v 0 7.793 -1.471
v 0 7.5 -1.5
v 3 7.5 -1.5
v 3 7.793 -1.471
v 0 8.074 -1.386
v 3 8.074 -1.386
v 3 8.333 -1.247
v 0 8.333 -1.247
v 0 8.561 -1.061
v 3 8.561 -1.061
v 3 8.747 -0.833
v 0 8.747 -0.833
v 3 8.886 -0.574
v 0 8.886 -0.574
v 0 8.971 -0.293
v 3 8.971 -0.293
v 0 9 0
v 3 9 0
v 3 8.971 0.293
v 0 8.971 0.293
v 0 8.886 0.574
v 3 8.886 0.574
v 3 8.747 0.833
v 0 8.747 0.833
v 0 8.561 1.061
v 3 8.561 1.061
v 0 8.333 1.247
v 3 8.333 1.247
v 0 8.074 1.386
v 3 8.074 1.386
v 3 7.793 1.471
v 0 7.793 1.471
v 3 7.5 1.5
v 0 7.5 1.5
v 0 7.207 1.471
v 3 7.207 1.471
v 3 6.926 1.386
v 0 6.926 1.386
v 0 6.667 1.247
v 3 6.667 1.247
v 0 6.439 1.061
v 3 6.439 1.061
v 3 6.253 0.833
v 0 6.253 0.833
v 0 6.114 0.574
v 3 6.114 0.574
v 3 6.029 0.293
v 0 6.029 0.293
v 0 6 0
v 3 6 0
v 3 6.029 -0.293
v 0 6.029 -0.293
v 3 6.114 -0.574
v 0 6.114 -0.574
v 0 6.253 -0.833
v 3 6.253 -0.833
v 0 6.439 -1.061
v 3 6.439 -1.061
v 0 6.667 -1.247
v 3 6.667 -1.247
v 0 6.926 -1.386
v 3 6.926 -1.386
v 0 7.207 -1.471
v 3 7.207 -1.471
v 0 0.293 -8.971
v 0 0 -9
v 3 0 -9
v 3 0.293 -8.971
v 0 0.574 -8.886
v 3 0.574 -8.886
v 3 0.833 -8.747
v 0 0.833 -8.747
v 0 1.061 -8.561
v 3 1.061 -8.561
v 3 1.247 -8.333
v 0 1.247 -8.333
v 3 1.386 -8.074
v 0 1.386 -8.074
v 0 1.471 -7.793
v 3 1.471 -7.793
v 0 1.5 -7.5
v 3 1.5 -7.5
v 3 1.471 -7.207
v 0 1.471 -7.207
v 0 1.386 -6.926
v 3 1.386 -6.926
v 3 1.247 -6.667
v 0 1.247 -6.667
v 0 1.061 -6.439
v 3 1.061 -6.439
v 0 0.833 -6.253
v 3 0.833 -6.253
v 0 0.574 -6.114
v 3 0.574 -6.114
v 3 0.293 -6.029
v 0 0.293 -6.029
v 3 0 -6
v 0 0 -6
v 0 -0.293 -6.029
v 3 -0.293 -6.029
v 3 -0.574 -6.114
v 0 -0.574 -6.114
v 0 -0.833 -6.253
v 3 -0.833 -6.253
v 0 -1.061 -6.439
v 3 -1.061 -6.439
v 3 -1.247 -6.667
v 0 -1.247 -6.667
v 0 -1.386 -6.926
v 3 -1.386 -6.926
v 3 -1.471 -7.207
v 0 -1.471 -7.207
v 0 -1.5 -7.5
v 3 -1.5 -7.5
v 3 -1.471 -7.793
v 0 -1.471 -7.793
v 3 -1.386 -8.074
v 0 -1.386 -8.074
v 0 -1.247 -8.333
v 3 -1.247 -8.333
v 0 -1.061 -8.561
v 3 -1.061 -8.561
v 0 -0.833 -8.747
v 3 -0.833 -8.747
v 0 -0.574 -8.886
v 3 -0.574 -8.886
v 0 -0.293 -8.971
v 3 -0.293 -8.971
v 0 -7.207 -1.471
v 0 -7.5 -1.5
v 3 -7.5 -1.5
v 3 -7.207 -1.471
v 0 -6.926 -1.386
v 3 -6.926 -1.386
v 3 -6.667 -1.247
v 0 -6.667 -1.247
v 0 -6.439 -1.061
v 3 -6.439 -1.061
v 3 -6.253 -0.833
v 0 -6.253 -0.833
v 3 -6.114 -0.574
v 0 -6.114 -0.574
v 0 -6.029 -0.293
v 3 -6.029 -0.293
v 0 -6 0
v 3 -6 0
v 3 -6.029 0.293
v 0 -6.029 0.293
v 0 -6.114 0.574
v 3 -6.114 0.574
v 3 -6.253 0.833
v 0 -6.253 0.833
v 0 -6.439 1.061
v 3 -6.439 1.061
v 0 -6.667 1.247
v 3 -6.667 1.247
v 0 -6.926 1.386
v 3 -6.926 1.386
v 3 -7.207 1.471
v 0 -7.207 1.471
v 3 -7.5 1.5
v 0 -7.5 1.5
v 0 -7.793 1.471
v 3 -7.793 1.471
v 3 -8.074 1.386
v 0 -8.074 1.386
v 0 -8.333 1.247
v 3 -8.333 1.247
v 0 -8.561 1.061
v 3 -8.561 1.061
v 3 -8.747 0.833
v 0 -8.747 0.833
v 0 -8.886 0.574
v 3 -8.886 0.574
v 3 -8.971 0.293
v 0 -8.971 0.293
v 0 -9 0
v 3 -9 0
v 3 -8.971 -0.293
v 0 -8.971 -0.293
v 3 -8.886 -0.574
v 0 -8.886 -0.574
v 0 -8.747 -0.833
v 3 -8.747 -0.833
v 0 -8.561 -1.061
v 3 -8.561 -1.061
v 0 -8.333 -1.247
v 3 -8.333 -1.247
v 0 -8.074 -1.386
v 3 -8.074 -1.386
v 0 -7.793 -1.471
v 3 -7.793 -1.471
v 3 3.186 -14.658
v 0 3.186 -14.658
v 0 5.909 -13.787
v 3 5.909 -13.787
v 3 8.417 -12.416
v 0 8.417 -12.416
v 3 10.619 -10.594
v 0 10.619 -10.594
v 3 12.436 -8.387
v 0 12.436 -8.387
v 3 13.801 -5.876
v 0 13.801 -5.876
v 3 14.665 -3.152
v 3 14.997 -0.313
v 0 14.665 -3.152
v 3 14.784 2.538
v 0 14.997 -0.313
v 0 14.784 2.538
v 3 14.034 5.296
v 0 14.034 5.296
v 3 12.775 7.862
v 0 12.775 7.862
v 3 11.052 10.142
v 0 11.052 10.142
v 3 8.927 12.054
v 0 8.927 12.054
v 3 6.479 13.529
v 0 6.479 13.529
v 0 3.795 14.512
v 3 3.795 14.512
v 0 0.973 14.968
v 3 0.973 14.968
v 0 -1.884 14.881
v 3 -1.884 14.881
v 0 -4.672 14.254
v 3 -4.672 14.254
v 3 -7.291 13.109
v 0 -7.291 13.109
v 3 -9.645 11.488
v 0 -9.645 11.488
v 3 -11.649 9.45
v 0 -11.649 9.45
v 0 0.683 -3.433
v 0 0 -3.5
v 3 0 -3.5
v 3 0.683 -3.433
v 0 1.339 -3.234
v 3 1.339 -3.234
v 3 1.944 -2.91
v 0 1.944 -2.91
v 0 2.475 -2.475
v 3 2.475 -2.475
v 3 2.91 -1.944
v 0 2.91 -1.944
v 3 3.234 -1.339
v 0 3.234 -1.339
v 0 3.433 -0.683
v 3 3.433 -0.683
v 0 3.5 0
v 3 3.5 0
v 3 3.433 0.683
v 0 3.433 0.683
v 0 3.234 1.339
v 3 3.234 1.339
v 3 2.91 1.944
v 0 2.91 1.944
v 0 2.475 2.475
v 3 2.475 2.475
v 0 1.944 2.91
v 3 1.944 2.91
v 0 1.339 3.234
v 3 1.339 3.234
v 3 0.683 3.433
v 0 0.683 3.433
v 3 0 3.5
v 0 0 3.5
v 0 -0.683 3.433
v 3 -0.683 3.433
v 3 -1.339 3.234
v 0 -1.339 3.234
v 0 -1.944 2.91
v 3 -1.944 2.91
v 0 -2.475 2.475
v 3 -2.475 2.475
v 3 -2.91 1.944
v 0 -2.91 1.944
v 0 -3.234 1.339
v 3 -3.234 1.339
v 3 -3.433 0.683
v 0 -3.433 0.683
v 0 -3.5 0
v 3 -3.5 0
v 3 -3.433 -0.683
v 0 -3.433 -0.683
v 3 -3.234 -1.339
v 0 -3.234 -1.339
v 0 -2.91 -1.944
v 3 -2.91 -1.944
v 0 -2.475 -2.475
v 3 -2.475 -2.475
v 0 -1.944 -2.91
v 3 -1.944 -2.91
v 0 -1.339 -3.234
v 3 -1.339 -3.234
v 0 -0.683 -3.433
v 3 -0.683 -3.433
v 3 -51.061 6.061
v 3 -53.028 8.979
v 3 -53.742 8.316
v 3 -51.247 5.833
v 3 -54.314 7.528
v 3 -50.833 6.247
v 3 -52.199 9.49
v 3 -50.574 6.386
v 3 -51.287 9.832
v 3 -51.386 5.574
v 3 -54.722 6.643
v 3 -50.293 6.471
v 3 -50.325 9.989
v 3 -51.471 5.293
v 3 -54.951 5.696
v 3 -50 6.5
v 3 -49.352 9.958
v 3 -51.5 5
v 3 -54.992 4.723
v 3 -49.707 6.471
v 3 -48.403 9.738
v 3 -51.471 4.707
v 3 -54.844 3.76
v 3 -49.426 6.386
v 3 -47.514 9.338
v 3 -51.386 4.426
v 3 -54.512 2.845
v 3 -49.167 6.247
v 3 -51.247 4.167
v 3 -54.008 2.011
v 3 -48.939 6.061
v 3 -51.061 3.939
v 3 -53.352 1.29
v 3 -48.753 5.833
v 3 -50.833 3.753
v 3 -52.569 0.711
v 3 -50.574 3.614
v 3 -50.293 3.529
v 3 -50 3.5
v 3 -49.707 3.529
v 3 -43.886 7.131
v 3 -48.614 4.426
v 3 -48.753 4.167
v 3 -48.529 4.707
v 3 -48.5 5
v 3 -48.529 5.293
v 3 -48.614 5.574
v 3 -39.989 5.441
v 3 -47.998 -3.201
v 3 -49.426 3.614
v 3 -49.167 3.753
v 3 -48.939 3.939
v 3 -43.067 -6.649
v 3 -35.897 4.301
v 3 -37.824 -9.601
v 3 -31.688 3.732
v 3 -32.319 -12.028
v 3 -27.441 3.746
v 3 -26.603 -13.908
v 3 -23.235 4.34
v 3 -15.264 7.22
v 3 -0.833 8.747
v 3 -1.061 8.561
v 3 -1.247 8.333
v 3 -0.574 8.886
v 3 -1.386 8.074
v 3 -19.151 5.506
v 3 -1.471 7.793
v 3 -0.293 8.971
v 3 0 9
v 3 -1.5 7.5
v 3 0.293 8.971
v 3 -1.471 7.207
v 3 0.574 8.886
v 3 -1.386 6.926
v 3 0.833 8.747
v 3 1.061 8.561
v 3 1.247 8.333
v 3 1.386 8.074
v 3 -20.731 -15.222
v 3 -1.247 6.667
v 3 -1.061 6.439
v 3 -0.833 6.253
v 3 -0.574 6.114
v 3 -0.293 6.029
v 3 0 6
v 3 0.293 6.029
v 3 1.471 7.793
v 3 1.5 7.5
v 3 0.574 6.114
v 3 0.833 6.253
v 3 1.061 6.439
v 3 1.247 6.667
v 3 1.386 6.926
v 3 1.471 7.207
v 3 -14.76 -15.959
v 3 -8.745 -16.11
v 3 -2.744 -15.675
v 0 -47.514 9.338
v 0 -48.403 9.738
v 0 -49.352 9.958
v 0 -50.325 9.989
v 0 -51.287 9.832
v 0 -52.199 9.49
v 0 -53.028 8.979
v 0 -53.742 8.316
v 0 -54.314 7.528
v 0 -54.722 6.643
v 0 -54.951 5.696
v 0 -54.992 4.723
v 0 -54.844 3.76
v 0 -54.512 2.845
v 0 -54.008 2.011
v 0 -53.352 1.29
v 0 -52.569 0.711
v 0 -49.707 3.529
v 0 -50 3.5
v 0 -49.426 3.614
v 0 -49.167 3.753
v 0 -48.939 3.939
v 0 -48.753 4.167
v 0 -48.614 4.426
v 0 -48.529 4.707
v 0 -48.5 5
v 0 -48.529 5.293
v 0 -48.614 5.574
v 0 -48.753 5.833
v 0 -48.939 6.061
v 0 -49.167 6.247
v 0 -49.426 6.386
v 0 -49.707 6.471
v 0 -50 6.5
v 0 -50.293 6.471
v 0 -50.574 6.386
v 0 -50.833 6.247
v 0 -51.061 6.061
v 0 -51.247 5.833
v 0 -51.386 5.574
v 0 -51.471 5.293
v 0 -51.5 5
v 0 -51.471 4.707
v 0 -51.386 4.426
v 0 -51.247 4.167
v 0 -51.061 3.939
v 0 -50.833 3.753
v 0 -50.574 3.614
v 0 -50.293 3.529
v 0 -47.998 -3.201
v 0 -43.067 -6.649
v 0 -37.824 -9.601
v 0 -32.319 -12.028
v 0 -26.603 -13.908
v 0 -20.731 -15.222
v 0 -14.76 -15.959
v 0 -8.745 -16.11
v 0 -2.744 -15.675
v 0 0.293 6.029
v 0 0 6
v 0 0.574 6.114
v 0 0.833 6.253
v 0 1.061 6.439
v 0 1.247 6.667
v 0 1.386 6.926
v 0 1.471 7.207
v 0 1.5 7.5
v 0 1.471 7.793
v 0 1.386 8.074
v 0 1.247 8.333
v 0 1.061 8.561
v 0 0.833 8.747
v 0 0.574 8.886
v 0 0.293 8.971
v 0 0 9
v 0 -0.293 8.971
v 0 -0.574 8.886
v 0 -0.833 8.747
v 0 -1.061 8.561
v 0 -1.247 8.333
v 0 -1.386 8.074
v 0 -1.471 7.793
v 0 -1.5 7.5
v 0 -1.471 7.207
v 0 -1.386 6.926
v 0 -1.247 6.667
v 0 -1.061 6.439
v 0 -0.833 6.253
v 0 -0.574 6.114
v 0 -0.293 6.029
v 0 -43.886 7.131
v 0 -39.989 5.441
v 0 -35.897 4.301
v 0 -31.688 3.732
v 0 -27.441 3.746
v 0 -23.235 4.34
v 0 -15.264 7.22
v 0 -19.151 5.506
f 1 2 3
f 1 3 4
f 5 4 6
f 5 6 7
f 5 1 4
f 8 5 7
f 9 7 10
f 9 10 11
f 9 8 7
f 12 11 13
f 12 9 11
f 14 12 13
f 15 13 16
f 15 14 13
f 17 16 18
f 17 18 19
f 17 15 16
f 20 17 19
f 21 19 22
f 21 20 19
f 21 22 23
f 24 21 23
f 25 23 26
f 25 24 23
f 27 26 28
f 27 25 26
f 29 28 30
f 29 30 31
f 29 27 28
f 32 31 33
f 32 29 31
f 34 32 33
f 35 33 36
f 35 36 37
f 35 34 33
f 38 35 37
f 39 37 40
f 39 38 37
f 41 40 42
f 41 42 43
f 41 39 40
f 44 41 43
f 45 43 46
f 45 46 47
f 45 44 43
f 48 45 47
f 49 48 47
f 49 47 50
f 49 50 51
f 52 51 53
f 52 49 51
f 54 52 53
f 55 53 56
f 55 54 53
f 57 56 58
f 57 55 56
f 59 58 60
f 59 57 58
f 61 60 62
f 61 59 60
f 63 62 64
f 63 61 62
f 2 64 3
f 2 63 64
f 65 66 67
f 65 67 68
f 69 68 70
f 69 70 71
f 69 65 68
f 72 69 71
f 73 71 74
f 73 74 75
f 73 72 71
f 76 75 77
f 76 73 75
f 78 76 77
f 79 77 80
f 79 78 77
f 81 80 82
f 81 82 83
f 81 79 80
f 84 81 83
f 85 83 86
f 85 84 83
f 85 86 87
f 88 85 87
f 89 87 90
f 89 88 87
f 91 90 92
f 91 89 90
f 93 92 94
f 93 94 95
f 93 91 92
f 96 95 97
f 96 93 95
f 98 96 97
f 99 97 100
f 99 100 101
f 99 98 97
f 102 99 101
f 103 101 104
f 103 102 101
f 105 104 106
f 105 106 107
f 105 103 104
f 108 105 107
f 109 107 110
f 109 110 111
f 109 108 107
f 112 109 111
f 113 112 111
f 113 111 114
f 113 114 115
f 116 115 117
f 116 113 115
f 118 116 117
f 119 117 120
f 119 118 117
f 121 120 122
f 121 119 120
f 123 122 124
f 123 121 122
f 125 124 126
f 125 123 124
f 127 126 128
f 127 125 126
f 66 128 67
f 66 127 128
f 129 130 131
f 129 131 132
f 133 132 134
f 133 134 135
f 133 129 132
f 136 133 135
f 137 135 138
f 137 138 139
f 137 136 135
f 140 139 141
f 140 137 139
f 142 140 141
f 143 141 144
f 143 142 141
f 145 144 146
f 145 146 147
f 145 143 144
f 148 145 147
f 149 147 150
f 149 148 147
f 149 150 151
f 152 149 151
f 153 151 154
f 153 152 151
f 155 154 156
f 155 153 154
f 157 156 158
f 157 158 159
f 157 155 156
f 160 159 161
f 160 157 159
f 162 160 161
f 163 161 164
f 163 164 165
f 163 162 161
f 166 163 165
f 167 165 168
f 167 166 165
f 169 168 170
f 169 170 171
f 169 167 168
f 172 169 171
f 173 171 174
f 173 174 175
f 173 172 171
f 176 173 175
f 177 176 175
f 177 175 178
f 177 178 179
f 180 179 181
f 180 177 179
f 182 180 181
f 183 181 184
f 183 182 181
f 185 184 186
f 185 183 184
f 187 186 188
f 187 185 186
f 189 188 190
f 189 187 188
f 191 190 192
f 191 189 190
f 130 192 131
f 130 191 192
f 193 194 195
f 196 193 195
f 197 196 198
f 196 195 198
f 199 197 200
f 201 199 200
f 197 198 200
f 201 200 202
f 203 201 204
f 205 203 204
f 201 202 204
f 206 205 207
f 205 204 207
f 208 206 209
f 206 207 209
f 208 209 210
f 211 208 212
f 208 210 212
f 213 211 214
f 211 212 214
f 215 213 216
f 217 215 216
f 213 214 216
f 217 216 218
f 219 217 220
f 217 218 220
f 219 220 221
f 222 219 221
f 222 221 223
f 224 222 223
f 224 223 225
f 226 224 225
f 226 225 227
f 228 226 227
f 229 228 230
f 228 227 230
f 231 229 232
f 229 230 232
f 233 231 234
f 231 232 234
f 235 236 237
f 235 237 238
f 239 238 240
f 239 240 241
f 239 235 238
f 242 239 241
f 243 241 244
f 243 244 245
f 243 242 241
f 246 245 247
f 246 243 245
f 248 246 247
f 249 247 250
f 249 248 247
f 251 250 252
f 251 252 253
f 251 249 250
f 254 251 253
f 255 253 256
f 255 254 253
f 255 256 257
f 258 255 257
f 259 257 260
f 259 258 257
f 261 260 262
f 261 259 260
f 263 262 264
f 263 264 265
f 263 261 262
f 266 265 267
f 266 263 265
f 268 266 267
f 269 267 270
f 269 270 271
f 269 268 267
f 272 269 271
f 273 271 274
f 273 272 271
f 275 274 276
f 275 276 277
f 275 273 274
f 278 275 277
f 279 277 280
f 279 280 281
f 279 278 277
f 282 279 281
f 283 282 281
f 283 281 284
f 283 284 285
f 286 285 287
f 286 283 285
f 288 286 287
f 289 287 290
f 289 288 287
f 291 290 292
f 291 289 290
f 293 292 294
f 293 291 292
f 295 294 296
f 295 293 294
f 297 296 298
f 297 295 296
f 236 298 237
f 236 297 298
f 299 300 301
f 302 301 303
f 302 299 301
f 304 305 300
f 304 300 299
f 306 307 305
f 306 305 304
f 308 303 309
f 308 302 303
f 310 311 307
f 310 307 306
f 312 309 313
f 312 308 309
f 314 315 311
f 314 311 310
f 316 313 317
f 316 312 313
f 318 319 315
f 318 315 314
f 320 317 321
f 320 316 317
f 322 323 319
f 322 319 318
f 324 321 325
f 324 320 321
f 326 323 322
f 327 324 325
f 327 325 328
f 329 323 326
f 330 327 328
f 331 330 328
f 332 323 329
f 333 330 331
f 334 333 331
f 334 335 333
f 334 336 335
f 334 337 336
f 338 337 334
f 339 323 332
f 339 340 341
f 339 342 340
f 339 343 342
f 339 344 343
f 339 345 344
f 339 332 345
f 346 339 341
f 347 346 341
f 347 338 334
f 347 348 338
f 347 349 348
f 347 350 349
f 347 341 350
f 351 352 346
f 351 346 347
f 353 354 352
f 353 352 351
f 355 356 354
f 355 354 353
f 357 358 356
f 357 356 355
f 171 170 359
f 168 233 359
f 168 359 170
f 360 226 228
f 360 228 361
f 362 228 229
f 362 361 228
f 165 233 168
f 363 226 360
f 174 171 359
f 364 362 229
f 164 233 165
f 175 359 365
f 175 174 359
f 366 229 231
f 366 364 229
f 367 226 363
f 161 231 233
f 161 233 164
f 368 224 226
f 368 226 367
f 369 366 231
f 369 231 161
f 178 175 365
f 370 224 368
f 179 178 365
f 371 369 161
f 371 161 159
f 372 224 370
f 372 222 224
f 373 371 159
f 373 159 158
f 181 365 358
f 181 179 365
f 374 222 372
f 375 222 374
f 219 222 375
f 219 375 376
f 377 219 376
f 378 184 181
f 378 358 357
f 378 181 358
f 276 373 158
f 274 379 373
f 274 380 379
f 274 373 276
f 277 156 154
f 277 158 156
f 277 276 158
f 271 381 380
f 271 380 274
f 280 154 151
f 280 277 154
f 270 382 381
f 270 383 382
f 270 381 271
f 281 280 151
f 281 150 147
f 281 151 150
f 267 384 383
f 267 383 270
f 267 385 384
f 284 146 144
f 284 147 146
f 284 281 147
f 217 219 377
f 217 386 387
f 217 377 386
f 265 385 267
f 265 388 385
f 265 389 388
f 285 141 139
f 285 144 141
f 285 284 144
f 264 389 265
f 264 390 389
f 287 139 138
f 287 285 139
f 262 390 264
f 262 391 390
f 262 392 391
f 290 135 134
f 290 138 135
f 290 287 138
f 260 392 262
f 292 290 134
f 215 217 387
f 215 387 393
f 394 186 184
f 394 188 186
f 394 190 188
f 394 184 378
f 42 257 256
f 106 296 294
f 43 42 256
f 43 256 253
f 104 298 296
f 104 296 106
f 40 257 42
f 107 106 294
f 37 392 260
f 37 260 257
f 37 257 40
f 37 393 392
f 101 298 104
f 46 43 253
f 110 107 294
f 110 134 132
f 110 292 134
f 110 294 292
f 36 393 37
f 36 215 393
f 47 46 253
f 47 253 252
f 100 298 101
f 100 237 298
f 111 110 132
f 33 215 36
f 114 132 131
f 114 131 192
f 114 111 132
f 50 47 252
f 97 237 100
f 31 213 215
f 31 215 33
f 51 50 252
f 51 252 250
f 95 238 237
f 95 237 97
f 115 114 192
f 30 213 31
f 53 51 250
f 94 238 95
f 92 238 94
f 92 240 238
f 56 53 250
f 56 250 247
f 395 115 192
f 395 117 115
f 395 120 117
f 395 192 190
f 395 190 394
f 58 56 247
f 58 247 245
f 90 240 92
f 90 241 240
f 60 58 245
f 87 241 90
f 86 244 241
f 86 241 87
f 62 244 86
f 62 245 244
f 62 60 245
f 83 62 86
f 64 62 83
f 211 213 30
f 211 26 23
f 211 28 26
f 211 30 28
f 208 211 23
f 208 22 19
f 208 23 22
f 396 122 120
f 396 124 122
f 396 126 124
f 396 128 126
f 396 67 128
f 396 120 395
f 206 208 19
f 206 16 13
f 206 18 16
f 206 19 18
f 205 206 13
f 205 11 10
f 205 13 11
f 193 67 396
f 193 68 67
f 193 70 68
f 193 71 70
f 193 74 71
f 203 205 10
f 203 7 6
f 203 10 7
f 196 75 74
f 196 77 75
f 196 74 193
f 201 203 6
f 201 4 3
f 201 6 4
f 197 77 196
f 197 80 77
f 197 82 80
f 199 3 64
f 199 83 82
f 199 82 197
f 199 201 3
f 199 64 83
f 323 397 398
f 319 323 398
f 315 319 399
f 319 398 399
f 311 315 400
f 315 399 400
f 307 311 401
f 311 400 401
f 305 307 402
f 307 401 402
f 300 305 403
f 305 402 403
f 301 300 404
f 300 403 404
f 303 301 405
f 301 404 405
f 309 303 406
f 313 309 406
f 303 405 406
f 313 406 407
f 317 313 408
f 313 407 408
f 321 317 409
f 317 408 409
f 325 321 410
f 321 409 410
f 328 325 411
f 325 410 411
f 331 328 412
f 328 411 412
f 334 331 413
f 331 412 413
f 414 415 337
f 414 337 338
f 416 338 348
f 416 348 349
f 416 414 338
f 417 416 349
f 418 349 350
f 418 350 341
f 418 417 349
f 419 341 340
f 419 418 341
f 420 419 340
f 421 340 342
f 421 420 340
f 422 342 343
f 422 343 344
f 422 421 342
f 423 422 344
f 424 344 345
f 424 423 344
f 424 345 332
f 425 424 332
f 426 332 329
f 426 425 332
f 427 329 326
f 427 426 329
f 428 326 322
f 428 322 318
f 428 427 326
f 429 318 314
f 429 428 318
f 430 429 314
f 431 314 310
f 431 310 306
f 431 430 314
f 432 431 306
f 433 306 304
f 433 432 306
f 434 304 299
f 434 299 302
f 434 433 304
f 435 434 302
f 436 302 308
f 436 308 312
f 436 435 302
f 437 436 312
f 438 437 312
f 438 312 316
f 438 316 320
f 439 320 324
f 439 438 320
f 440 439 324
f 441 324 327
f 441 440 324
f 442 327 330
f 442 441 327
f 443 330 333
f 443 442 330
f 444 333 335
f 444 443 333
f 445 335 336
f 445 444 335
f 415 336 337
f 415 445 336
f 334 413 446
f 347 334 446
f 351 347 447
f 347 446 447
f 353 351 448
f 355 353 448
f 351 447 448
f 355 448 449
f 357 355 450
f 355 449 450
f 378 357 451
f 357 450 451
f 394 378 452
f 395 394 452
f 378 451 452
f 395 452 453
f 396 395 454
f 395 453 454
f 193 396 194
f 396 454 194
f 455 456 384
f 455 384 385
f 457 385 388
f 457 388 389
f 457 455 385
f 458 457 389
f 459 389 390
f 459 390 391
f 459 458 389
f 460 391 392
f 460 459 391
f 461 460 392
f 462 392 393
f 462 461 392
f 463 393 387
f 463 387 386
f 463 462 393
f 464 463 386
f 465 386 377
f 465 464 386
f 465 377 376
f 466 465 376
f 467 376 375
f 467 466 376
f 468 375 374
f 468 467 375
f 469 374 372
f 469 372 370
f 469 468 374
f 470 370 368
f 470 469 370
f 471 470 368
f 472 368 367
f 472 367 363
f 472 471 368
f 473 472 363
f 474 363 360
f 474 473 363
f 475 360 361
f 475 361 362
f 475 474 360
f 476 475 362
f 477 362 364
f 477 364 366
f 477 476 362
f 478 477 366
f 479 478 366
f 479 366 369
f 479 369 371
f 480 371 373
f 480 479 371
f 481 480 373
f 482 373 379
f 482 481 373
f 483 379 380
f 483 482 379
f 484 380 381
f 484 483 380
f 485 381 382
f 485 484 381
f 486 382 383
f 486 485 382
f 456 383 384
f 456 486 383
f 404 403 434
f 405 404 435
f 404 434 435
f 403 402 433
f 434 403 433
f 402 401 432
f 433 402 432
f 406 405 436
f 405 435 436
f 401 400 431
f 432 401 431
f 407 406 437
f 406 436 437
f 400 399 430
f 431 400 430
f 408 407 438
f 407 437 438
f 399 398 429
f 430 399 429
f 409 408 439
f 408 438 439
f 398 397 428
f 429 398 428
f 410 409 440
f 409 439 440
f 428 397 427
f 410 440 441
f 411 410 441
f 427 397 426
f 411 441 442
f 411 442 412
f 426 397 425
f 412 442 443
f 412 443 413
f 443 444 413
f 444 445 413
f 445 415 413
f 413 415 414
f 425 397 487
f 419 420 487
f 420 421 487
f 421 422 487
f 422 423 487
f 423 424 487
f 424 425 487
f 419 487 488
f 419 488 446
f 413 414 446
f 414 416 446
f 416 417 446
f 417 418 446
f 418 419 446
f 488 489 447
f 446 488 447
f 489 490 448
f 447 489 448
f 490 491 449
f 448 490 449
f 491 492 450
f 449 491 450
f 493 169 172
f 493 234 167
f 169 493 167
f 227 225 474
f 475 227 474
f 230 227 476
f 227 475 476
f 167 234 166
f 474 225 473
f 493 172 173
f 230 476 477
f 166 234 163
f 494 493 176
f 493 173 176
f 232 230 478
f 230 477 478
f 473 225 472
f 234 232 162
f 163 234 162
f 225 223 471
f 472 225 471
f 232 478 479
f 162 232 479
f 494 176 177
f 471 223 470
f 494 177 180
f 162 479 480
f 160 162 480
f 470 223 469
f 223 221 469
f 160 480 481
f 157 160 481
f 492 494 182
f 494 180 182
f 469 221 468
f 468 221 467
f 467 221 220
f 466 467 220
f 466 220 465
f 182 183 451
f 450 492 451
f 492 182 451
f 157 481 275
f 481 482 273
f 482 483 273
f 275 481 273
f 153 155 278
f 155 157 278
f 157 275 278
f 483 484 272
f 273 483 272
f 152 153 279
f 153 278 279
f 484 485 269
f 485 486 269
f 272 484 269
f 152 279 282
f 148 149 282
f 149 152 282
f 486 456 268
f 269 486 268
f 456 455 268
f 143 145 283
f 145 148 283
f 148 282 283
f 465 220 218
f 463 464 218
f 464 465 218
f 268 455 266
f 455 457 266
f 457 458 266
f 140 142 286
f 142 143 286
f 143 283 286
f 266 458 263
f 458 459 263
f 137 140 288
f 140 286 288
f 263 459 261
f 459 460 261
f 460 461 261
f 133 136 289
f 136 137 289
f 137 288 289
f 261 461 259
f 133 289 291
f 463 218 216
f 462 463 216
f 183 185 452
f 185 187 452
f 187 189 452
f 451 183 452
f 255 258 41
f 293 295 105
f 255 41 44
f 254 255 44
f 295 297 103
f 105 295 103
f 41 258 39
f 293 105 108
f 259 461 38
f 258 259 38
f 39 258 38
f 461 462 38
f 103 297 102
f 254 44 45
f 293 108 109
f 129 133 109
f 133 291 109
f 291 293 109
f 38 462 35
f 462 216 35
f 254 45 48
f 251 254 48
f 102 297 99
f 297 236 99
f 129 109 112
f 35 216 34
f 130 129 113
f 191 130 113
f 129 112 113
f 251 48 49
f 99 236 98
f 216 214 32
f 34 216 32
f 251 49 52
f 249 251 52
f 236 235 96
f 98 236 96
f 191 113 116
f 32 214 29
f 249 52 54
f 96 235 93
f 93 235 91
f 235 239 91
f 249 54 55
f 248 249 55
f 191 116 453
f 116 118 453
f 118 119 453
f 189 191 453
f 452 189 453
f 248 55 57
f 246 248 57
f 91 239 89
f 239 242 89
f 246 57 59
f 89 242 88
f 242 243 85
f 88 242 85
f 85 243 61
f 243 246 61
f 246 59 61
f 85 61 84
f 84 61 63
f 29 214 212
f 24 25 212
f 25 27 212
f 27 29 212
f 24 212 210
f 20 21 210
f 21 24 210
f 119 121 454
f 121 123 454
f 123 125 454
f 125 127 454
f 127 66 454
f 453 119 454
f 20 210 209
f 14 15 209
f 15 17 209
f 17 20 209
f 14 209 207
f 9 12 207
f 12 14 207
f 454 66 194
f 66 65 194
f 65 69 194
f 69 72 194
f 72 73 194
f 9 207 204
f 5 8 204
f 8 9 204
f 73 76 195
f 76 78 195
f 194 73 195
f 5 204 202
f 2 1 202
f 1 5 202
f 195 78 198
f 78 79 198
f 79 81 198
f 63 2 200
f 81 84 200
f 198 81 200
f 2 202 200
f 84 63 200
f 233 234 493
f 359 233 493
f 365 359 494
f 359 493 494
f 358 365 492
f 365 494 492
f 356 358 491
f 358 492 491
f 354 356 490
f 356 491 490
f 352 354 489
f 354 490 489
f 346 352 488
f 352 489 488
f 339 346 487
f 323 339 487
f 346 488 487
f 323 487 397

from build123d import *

# Parameters (mm, degrees)
CROQUIS1_R              = 3.5
CROQUIS1_R_2            = 1.5
SALIENTE_EXTRUIR1_DEPTH = 3


with BuildPart() as part:
    # Croquis1 → Saliente-Extruir1 (new body)
    with BuildSketch(Plane(origin=(0, 0, 0), x_dir=(0, 0, -1), z_dir=(1, 0, 0))):
        with BuildLine():
            ThreePointArc((14.657670874, 3.186327753), (-7.861609872, 12.774783372), (-9.449564448, -11.64928031))
            ThreePointArc((-9.449564448, -11.64928031), (-3.666028079, -29.56400504), (-9.338328875, -47.514260157))
            ThreePointArc((-9.338328875, -47.514260157), (-7.527733898, -54.313995983), (-0.71074339, -52.569489781))
            ThreePointArc((-0.71074339, -52.569489781), (13.908083657, -26.603024812), (14.657670874, 3.186327753))
        make_face()
        Circle(CROQUIS1_R, mode=Mode.SUBTRACT)
        with Locations((-5, -50)):
            Circle(CROQUIS1_R_2, mode=Mode.SUBTRACT)
        with Locations((-7.5, 0)):
            Circle(CROQUIS1_R_2, mode=Mode.SUBTRACT)
        with Locations((0, 7.5)):
            Circle(CROQUIS1_R_2, mode=Mode.SUBTRACT)
        with Locations((7.5, 0)):
            Circle(CROQUIS1_R_2, mode=Mode.SUBTRACT)
        with Locations((0, -7.5)):
            Circle(CROQUIS1_R_2, mode=Mode.SUBTRACT)
    extrude(amount=SALIENTE_EXTRUIR1_DEPTH)


solid = part.part
